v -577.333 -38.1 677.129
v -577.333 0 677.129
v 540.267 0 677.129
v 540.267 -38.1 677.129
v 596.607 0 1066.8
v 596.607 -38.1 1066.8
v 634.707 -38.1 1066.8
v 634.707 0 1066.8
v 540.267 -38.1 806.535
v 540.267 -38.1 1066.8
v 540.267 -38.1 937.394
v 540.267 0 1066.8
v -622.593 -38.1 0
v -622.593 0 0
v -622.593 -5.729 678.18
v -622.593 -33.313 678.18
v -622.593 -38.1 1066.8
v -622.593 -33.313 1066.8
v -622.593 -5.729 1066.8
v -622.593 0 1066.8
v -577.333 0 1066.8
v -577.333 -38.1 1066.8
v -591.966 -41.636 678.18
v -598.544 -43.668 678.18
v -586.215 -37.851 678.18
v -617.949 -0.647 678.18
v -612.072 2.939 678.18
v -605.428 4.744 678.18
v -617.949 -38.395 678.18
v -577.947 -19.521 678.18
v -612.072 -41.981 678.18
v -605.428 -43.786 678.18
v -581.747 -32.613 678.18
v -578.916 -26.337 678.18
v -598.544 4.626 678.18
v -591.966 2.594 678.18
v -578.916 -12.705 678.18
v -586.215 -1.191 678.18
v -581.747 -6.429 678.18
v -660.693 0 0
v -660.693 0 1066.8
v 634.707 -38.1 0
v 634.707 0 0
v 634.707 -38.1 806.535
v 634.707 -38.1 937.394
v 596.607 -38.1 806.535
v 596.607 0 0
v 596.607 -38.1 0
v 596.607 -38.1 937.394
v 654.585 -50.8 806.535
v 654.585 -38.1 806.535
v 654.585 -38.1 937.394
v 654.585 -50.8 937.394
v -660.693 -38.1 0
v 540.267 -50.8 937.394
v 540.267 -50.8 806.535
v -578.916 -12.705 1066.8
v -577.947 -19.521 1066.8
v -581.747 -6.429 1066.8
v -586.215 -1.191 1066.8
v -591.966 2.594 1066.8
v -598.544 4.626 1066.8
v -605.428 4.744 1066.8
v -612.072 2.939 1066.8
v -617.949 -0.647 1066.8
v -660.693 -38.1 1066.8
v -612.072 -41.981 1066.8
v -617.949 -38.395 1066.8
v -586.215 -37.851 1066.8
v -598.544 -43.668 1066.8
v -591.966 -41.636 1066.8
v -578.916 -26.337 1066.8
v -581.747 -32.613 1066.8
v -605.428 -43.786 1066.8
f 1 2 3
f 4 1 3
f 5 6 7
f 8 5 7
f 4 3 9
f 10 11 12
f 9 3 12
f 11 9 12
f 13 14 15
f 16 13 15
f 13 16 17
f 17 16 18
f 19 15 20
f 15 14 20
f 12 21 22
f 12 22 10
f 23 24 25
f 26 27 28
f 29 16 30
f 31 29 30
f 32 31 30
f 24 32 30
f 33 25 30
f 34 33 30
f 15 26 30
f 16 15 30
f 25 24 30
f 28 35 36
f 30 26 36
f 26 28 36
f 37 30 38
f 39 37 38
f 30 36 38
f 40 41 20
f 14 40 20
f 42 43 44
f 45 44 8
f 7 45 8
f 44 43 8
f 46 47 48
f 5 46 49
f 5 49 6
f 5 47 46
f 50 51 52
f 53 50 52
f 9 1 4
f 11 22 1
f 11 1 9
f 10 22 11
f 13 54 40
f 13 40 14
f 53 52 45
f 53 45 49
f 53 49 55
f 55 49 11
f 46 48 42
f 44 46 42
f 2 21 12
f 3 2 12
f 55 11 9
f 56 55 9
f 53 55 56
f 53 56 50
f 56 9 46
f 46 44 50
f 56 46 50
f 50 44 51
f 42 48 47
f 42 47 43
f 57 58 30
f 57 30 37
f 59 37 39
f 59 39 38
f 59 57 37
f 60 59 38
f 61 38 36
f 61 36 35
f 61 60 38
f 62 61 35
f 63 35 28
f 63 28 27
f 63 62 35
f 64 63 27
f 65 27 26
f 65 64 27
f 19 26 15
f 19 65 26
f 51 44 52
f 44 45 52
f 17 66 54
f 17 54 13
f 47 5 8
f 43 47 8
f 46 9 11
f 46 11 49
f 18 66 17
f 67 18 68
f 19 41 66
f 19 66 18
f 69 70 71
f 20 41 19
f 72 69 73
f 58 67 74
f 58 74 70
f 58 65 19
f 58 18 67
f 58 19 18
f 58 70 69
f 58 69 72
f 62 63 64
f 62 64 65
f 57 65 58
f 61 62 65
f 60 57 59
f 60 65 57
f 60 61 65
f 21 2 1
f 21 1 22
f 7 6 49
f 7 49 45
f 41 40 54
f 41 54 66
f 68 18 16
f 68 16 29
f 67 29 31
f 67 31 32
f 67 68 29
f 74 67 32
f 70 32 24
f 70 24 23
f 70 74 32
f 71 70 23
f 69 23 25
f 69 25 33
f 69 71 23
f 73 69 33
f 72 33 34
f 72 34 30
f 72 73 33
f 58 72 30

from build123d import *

# Parameters (mm, degrees)
F0_W     = 38.1
F0_H     = 1066.8
F0_W_2   = 1117.6
F0_H_2   = 389.671327
F1_DEPTH = 38.1
F3_DEPTH = 388.62
F5_DEPTH = 12.7


with BuildPart() as f1:
    # F0 (on Front) → F1 (new body)
    with BuildSketch(Plane.XZ):
        with Locations((615.656533, 533.4)):
            Rectangle(F0_W, F0_H)
        with Locations((-641.643467, 533.4)):
            Rectangle(F0_W, F0_H)
        with Locations((-18.532595, 871.964336)):
            Rectangle(F0_W_2, F0_H_2)
    extrude(amount=F1_DEPTH)

    # F2 (on face) → F3 (join)
    with BuildSketch(Plane.XY.offset(1066.8)):
        with BuildLine():
            ThreePointArc((-622.593467, -33.312779), (-595.183041, -42.885023), (-577.947038, -19.520959))
            ThreePointArc((-577.947038, -19.520959), (-595.183041, 3.843105), (-622.593467, -5.729139))
            Line((-622.593467, -5.729139), (-622.593467, -33.312779))
        make_face()
    extrude(amount=-F3_DEPTH)

    # F4 (on face) → F5 (join)
    with BuildSketch(Plane.XZ.offset(38.1)):
        Polygon((654.584706, 806.53453), (654.584706, 871.964336), (654.584706, 937.394142), (540.267405, 937.394142), (540.267405, 871.964336), (540.267405, 806.53453), align=None)
    extrude(amount=F5_DEPTH)


solid = f1.part
